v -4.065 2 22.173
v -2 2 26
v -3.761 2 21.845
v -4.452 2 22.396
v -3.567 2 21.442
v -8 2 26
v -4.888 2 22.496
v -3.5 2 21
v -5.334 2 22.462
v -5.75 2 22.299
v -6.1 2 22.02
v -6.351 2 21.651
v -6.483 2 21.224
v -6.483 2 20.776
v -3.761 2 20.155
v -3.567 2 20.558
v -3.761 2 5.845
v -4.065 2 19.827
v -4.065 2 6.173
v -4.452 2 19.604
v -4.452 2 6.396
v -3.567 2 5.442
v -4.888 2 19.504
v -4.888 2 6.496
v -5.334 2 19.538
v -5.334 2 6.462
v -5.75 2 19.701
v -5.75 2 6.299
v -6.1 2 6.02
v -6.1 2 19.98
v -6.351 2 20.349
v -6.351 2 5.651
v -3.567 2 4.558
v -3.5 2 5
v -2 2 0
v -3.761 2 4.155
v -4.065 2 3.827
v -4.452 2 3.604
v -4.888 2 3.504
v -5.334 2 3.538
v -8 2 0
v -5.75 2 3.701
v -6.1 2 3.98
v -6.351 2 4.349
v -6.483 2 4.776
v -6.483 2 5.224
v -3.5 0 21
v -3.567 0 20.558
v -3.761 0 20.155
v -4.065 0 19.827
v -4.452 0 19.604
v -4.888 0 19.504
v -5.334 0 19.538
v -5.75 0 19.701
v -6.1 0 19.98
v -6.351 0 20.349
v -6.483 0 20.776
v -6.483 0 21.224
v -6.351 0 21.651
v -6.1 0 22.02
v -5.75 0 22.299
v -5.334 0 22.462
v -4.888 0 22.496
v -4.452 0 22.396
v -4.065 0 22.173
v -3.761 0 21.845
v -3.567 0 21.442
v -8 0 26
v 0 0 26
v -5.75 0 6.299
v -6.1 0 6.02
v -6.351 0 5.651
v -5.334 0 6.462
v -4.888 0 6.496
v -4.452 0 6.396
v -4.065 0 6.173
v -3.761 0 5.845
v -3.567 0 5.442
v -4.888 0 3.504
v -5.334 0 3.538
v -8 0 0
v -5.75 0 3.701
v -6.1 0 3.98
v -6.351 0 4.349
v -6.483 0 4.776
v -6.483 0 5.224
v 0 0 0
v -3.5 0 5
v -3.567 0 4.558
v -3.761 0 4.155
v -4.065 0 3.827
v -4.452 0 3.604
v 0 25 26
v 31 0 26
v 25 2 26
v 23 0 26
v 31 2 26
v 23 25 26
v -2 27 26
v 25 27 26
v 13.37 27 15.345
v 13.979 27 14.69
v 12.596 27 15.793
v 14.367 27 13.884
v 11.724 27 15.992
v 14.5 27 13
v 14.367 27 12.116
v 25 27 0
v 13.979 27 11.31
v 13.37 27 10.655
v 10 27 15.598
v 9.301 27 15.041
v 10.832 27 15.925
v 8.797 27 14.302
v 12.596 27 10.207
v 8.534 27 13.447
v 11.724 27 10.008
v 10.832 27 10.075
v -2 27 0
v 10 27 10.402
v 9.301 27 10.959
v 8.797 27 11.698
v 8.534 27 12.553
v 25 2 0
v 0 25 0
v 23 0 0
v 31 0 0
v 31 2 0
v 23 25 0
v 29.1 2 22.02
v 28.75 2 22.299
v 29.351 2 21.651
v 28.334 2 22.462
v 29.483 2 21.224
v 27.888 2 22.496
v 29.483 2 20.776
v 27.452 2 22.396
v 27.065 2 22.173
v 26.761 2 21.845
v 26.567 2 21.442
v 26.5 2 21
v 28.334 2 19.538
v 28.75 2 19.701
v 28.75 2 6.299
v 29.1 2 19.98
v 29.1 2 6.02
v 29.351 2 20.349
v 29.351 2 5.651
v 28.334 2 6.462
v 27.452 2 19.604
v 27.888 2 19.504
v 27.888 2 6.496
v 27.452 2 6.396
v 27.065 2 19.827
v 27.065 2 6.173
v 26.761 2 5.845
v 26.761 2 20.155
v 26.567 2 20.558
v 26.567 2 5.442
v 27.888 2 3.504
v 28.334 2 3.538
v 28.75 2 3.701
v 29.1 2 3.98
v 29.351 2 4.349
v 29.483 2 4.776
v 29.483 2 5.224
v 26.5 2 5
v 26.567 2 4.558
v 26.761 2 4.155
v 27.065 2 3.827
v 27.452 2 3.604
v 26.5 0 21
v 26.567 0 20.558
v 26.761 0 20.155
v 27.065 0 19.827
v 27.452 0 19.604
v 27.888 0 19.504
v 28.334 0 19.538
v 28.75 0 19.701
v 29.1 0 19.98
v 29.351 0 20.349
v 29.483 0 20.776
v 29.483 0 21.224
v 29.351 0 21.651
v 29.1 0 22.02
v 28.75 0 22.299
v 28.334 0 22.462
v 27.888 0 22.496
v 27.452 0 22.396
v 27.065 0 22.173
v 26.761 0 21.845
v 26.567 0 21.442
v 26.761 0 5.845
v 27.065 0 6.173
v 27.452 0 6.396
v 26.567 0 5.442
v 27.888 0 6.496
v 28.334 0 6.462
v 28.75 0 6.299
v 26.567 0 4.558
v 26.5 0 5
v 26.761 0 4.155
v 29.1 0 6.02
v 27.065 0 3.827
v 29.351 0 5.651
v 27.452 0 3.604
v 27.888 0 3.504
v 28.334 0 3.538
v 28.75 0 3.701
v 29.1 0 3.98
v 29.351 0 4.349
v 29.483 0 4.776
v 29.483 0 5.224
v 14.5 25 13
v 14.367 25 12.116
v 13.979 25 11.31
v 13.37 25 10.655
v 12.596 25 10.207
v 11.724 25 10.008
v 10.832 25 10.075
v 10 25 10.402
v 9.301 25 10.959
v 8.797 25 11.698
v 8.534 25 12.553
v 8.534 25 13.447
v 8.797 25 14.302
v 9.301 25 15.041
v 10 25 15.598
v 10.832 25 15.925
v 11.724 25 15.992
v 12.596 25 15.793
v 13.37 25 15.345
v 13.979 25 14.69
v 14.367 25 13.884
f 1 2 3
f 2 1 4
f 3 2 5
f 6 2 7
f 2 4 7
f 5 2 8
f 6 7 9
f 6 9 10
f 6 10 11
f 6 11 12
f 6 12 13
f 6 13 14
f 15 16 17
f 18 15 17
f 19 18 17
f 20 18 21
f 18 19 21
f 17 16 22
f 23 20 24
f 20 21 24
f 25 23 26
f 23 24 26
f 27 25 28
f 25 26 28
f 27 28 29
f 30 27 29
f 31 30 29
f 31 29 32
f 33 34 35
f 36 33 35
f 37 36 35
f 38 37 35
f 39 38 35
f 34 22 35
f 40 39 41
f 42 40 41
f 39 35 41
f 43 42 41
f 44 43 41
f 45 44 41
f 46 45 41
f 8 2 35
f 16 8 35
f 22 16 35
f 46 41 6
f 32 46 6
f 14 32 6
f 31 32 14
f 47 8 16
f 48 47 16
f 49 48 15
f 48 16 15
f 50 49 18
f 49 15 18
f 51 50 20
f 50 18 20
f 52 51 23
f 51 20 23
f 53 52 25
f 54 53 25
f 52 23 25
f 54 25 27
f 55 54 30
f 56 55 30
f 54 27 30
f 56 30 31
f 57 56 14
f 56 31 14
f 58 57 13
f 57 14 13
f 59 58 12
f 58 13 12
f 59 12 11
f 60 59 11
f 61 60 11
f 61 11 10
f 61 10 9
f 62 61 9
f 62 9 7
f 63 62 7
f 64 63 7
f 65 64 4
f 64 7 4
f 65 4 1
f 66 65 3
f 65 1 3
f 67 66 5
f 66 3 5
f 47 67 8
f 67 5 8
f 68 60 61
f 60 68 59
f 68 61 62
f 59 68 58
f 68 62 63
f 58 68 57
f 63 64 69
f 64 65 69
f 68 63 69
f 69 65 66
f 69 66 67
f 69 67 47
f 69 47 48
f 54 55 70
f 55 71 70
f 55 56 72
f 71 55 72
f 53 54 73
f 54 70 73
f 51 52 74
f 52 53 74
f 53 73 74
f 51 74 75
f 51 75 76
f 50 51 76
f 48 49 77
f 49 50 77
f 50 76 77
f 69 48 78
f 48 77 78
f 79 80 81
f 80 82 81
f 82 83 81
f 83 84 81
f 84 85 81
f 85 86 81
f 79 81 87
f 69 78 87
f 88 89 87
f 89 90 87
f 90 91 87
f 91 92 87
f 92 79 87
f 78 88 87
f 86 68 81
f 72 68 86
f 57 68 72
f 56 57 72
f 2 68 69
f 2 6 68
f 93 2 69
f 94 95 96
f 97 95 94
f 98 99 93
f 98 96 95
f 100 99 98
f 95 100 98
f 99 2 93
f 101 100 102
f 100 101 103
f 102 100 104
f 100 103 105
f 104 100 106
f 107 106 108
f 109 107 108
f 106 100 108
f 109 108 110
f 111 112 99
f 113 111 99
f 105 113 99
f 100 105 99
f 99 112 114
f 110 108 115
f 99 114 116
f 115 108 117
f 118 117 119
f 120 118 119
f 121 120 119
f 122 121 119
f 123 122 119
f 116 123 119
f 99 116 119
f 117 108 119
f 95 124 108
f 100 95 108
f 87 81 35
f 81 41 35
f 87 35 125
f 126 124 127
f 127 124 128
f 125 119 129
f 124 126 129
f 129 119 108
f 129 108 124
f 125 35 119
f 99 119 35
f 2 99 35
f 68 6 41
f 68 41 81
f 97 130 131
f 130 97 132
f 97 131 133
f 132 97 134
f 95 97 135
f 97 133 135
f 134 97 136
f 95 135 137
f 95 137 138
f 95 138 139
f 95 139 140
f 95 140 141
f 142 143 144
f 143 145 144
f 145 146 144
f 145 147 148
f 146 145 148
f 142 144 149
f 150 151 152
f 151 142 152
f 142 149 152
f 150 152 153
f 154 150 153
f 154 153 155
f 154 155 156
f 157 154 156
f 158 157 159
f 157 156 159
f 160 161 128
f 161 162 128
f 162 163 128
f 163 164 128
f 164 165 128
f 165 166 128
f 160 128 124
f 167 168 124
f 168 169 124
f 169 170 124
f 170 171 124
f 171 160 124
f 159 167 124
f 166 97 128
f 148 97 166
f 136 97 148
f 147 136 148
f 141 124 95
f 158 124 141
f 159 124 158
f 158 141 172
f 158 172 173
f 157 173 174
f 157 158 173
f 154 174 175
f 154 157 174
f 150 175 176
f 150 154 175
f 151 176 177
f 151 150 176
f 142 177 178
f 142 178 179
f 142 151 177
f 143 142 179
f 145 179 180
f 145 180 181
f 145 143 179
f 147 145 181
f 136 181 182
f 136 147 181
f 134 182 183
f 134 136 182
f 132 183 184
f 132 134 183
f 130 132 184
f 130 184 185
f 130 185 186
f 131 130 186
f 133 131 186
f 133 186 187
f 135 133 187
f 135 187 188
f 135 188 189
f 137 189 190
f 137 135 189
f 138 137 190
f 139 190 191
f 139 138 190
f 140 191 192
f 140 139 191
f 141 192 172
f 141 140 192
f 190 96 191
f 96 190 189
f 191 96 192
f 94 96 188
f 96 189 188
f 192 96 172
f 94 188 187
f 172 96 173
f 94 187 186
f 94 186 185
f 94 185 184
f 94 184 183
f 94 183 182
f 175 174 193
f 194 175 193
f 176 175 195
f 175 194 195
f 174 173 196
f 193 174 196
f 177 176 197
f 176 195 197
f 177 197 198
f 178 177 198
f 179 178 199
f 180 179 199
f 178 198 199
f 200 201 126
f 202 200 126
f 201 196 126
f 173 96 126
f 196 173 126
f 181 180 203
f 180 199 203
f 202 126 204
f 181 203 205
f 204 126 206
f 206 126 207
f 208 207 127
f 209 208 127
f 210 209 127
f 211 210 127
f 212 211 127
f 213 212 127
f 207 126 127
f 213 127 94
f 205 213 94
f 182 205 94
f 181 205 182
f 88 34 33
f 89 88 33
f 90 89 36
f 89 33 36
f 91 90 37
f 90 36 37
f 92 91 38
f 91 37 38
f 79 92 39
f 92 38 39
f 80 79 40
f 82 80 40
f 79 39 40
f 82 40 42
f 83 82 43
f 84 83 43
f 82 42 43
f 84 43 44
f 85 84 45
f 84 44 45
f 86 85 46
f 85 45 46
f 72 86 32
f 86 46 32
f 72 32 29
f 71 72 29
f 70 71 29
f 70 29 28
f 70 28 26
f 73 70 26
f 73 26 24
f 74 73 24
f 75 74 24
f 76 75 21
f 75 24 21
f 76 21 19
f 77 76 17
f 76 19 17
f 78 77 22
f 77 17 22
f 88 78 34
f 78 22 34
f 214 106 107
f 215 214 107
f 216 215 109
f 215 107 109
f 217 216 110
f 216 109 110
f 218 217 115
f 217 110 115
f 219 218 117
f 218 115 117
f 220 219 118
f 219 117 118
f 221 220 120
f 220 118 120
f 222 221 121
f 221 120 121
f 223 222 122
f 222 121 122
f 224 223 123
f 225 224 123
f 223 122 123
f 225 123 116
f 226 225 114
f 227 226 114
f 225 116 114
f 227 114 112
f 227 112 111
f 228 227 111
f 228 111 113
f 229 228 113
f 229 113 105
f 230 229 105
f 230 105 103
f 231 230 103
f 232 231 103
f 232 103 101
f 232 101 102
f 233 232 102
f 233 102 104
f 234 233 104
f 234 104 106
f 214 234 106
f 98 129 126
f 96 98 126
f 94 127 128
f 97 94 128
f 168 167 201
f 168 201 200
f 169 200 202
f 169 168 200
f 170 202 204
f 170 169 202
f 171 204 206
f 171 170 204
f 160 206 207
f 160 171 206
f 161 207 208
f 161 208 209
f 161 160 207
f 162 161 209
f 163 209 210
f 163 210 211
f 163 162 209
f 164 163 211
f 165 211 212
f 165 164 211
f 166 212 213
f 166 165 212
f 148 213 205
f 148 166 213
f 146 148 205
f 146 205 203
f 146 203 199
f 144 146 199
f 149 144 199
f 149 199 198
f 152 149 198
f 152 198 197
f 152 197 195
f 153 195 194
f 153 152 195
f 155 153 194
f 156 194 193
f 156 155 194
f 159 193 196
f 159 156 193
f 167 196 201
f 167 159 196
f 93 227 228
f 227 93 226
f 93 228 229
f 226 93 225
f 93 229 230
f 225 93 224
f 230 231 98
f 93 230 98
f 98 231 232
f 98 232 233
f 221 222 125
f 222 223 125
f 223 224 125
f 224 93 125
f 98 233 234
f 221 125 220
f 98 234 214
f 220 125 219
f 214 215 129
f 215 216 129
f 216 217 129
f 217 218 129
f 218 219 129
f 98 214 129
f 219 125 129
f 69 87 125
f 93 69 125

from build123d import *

# Parameters (mm, degrees)
EXTRU_MINCE1_DEPTH = 26
EXTRUSION1_REACH   = 50.642
ESQUISSE4_R        = 3
EXTRUSION2_REACH   = 49.56
ESQUISSE5_R        = 1.5


with BuildPart() as part:
    # Esquisse1 → Extru.-Mince1 (new body)
    with BuildSketch(Plane.XY):
        Polygon((-8, 0), (0, 0), (0, 25), (23, 25), (23, 0), (31, 0), (31, 2), (25, 2), (25, 27), (-2, 27), (-2, 2), (-8, 2), align=None)
    extrude(amount=EXTRU_MINCE1_DEPTH)

    # Esquisse4 → Extrusion1 (cut, up to next)
    with BuildSketch(Plane(origin=(0, 27, 0), x_dir=(1, 0, 0), z_dir=(0, 1, 0)), mode=Mode.PRIVATE) as extrusion1_sk1:
        with Locations((11.5, -13)):
            Circle(ESQUISSE4_R)
    extrusion1_tool1 = extrude(extrusion1_sk1.sketch, amount=-EXTRUSION1_REACH, mode=Mode.PRIVATE) & part.part
    add(extrusion1_tool1.solids().sort_by_distance((11.5, 27, 13))[0], mode=Mode.SUBTRACT)

    # Esquisse5 → Extrusion2 (cut, up to next)
    with BuildSketch(Plane(origin=(0, 2, 0), x_dir=(1, 0, 0), z_dir=(0, 1, 0)), mode=Mode.PRIVATE) as extrusion2_sk1:
        with Locations((-5, -21)):
            Circle(ESQUISSE5_R)
    extrusion2_tool1 = extrude(extrusion2_sk1.sketch, amount=-EXTRUSION2_REACH, mode=Mode.PRIVATE) & part.part
    # Esquisse5 → Extrusion2 (cut, up to next)
    with BuildSketch(Plane(origin=(0, 2, 0), x_dir=(1, 0, 0), z_dir=(0, 1, 0)), mode=Mode.PRIVATE) as extrusion2_sk2:
        with Locations((-5, -5)):
            Circle(ESQUISSE5_R)
    extrusion2_tool2 = extrude(extrusion2_sk2.sketch, amount=-EXTRUSION2_REACH, mode=Mode.PRIVATE) & part.part
    extrusion2_1 = extrusion2_tool1.solids().sort_by_distance((-5, 2, 21))[0]
    add(extrusion2_1, mode=Mode.SUBTRACT)
    extrusion2_2 = extrusion2_tool2.solids().sort_by_distance((-5, 2, 5))[0]
    add(extrusion2_2, mode=Mode.SUBTRACT)
    extrusion2 = extrusion2_1 + extrusion2_2  # Extrusion2 as one shape, for the pattern or mirror that repeats it

    # Symétrie1: Extrusion2 across plane
    add(extrusion2.mirror(Plane(origin=(11.5, 27, 26), x_dir=(0, 0, 1), z_dir=(-1, 0, 0))), mode=Mode.SUBTRACT)


solid = part.part
